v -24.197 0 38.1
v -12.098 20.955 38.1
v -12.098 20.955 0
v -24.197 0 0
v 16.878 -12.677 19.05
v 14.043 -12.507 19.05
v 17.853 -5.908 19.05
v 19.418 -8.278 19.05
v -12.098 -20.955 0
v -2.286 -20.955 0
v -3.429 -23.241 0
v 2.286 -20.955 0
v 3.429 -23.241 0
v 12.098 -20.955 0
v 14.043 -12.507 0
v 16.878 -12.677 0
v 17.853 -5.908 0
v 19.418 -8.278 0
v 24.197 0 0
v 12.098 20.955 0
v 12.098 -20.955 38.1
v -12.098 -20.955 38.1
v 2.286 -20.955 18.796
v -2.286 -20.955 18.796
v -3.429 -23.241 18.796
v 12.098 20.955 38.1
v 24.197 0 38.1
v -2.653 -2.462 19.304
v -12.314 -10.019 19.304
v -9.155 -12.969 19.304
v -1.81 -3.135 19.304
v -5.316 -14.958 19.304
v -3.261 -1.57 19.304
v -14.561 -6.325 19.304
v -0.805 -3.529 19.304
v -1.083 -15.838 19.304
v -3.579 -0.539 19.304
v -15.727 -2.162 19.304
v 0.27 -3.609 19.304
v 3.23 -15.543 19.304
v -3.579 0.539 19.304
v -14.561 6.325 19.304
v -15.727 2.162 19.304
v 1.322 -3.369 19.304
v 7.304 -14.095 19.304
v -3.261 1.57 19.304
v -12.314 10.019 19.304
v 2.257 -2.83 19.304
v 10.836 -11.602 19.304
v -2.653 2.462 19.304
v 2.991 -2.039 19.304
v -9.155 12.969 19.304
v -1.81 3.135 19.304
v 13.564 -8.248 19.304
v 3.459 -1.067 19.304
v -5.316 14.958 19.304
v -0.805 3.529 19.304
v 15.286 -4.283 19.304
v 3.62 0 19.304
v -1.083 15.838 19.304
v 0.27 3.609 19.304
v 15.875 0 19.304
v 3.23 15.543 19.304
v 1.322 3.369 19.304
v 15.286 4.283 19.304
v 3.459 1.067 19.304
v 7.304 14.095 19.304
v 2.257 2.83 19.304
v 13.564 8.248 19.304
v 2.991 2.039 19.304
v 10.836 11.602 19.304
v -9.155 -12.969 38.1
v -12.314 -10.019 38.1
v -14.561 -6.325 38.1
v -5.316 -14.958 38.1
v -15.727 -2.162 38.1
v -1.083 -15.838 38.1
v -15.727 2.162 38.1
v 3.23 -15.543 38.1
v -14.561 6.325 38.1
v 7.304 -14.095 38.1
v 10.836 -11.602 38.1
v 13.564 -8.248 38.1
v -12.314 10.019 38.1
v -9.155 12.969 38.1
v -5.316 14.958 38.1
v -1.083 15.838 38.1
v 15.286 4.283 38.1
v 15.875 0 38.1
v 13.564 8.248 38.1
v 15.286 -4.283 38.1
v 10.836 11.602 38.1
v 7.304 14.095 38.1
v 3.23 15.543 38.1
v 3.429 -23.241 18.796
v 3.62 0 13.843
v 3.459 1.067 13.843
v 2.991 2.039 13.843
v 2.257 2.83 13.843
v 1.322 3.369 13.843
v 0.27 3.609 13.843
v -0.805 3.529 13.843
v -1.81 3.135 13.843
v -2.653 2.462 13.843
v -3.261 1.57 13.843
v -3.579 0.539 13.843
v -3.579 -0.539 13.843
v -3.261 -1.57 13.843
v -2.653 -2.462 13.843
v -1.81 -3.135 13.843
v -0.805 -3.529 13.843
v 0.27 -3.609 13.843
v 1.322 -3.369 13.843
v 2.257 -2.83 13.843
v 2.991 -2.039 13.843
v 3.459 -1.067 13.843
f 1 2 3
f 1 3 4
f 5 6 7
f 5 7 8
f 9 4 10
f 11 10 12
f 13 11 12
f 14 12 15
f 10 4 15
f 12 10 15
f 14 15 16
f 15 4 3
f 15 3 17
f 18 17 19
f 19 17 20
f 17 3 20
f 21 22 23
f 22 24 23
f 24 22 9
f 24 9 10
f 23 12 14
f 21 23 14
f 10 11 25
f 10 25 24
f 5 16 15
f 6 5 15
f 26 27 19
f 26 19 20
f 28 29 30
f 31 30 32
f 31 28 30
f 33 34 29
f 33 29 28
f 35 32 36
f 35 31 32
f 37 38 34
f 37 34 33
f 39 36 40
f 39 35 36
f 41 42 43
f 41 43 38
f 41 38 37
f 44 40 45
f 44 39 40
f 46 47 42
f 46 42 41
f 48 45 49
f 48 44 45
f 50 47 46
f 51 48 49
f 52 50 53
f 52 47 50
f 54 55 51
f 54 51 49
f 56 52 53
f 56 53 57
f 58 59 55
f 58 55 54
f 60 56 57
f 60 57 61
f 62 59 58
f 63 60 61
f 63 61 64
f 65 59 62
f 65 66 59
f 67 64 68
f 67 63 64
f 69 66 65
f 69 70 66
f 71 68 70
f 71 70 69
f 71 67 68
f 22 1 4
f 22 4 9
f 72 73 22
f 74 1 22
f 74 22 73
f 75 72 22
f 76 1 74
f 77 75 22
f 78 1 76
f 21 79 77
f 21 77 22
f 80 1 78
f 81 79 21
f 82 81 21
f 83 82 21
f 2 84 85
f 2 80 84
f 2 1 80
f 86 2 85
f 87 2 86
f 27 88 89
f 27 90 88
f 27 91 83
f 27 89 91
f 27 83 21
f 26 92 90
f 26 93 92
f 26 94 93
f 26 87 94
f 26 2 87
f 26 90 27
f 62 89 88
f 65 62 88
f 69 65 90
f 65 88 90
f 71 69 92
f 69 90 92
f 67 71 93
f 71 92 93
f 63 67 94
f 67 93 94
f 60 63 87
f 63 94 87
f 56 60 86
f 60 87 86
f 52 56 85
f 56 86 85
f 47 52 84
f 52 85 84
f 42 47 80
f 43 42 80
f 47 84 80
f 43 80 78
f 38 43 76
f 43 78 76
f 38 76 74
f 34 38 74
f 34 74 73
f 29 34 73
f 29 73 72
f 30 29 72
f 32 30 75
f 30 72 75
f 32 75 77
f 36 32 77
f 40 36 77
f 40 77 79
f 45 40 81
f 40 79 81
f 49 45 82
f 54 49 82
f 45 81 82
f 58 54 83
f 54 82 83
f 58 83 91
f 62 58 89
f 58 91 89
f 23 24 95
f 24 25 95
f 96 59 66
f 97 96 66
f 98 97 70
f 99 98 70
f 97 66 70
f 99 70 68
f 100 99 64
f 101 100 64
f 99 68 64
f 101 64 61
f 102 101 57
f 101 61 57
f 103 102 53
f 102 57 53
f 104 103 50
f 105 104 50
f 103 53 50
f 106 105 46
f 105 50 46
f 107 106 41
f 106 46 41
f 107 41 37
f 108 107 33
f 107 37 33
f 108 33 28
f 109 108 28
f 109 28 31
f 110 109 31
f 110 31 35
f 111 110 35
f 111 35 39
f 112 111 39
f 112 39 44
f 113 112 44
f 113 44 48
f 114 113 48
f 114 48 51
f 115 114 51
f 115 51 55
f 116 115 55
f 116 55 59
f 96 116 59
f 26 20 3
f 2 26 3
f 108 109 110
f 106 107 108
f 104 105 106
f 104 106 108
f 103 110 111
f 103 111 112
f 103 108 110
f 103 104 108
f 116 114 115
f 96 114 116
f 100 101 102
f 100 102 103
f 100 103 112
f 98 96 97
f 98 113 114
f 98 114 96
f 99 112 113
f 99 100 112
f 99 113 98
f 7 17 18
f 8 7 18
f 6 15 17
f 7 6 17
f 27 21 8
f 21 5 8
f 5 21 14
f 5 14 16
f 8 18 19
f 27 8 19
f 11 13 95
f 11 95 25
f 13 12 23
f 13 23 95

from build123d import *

# Parameters (mm, degrees)
F1_DEPTH  = 38.1
F3_DEPTH  = 18.796
F4_R      = 15.875
F5_DEPTH  = 18.796
F6_R      = 3.6195
F7_DEPTH  = 24.257
F9_DEPTH  = 18.796
F11_DEPTH = 19.05


with BuildPart() as f1:
    # F0 (on Top) → F1 (new body)
    with BuildSketch(Plane.XY):
        Polygon((-12.0983748909, -20.955), (12.0983748909, -20.955), (24.1967497817, 0), (12.0983748909, 20.955), (-12.0983748909, 20.955), (-24.1967497817, 0), align=None)
    extrude(amount=F1_DEPTH)

    # F2 (on face) → F3 (cut)
    with BuildSketch(Plane.XY.offset(38.1)):
        Polygon((-11.365140049, -19.685), (11.365140049, -19.685), (22.730280098, 0), (11.365140049, 19.685), (-11.365140049, 19.685), (-22.730280098, 0), align=None)
    extrude(amount=-F3_DEPTH, mode=Mode.SUBTRACT)

    # F4 (on face) → F5 (join)
    with BuildSketch(Plane.XY.offset(38.1)):
        Polygon((-22.730280098, 0), (-11.365140049, -19.685), (11.365140049, -19.685), (22.730280098, 0), (11.365140049, 19.685), (-11.365140049, 19.685), align=None)
        Circle(F4_R, mode=Mode.SUBTRACT)
    extrude(amount=-F5_DEPTH)

    # F6 (on face) → F7 (cut)
    with BuildSketch(Plane.XY.offset(38.1)):
        Circle(F6_R)
    extrude(amount=-F7_DEPTH, mode=Mode.SUBTRACT)

    # F8 (on face) → F9 (join)
    with BuildSketch(Plane(origin=(0, 0, 0), x_dir=(1, 0, 0), z_dir=(0, 0, -1))):
        Polygon((-2.286, 20.955), (0, 20.955), (0, 23.241), (-3.429, 23.241), align=None)
        Polygon((0, 23.241), (0, 20.955), (2.286, 20.955), (3.429, 23.241), align=None)
    extrude(amount=-F9_DEPTH)

    # F10 (on face) → F11 (cut)
    with BuildSketch(Plane(origin=(0, 0, 0), x_dir=(1, 0, 0), z_dir=(0, 0, -1))):
        Polygon((19.4175623363, 8.2777954744), (18.1475623363, 10.4775), (15.9478578107, 9.2075), (17.8528578107, 5.9079432116), align=None)
        Polygon((15.9478578107, 9.2075), (18.1475623363, 10.4775), (16.8775623363, 12.6772045256), (14.0428578107, 12.5070567884), align=None)
    extrude(amount=-F11_DEPTH, mode=Mode.SUBTRACT)


solid = f1.part
